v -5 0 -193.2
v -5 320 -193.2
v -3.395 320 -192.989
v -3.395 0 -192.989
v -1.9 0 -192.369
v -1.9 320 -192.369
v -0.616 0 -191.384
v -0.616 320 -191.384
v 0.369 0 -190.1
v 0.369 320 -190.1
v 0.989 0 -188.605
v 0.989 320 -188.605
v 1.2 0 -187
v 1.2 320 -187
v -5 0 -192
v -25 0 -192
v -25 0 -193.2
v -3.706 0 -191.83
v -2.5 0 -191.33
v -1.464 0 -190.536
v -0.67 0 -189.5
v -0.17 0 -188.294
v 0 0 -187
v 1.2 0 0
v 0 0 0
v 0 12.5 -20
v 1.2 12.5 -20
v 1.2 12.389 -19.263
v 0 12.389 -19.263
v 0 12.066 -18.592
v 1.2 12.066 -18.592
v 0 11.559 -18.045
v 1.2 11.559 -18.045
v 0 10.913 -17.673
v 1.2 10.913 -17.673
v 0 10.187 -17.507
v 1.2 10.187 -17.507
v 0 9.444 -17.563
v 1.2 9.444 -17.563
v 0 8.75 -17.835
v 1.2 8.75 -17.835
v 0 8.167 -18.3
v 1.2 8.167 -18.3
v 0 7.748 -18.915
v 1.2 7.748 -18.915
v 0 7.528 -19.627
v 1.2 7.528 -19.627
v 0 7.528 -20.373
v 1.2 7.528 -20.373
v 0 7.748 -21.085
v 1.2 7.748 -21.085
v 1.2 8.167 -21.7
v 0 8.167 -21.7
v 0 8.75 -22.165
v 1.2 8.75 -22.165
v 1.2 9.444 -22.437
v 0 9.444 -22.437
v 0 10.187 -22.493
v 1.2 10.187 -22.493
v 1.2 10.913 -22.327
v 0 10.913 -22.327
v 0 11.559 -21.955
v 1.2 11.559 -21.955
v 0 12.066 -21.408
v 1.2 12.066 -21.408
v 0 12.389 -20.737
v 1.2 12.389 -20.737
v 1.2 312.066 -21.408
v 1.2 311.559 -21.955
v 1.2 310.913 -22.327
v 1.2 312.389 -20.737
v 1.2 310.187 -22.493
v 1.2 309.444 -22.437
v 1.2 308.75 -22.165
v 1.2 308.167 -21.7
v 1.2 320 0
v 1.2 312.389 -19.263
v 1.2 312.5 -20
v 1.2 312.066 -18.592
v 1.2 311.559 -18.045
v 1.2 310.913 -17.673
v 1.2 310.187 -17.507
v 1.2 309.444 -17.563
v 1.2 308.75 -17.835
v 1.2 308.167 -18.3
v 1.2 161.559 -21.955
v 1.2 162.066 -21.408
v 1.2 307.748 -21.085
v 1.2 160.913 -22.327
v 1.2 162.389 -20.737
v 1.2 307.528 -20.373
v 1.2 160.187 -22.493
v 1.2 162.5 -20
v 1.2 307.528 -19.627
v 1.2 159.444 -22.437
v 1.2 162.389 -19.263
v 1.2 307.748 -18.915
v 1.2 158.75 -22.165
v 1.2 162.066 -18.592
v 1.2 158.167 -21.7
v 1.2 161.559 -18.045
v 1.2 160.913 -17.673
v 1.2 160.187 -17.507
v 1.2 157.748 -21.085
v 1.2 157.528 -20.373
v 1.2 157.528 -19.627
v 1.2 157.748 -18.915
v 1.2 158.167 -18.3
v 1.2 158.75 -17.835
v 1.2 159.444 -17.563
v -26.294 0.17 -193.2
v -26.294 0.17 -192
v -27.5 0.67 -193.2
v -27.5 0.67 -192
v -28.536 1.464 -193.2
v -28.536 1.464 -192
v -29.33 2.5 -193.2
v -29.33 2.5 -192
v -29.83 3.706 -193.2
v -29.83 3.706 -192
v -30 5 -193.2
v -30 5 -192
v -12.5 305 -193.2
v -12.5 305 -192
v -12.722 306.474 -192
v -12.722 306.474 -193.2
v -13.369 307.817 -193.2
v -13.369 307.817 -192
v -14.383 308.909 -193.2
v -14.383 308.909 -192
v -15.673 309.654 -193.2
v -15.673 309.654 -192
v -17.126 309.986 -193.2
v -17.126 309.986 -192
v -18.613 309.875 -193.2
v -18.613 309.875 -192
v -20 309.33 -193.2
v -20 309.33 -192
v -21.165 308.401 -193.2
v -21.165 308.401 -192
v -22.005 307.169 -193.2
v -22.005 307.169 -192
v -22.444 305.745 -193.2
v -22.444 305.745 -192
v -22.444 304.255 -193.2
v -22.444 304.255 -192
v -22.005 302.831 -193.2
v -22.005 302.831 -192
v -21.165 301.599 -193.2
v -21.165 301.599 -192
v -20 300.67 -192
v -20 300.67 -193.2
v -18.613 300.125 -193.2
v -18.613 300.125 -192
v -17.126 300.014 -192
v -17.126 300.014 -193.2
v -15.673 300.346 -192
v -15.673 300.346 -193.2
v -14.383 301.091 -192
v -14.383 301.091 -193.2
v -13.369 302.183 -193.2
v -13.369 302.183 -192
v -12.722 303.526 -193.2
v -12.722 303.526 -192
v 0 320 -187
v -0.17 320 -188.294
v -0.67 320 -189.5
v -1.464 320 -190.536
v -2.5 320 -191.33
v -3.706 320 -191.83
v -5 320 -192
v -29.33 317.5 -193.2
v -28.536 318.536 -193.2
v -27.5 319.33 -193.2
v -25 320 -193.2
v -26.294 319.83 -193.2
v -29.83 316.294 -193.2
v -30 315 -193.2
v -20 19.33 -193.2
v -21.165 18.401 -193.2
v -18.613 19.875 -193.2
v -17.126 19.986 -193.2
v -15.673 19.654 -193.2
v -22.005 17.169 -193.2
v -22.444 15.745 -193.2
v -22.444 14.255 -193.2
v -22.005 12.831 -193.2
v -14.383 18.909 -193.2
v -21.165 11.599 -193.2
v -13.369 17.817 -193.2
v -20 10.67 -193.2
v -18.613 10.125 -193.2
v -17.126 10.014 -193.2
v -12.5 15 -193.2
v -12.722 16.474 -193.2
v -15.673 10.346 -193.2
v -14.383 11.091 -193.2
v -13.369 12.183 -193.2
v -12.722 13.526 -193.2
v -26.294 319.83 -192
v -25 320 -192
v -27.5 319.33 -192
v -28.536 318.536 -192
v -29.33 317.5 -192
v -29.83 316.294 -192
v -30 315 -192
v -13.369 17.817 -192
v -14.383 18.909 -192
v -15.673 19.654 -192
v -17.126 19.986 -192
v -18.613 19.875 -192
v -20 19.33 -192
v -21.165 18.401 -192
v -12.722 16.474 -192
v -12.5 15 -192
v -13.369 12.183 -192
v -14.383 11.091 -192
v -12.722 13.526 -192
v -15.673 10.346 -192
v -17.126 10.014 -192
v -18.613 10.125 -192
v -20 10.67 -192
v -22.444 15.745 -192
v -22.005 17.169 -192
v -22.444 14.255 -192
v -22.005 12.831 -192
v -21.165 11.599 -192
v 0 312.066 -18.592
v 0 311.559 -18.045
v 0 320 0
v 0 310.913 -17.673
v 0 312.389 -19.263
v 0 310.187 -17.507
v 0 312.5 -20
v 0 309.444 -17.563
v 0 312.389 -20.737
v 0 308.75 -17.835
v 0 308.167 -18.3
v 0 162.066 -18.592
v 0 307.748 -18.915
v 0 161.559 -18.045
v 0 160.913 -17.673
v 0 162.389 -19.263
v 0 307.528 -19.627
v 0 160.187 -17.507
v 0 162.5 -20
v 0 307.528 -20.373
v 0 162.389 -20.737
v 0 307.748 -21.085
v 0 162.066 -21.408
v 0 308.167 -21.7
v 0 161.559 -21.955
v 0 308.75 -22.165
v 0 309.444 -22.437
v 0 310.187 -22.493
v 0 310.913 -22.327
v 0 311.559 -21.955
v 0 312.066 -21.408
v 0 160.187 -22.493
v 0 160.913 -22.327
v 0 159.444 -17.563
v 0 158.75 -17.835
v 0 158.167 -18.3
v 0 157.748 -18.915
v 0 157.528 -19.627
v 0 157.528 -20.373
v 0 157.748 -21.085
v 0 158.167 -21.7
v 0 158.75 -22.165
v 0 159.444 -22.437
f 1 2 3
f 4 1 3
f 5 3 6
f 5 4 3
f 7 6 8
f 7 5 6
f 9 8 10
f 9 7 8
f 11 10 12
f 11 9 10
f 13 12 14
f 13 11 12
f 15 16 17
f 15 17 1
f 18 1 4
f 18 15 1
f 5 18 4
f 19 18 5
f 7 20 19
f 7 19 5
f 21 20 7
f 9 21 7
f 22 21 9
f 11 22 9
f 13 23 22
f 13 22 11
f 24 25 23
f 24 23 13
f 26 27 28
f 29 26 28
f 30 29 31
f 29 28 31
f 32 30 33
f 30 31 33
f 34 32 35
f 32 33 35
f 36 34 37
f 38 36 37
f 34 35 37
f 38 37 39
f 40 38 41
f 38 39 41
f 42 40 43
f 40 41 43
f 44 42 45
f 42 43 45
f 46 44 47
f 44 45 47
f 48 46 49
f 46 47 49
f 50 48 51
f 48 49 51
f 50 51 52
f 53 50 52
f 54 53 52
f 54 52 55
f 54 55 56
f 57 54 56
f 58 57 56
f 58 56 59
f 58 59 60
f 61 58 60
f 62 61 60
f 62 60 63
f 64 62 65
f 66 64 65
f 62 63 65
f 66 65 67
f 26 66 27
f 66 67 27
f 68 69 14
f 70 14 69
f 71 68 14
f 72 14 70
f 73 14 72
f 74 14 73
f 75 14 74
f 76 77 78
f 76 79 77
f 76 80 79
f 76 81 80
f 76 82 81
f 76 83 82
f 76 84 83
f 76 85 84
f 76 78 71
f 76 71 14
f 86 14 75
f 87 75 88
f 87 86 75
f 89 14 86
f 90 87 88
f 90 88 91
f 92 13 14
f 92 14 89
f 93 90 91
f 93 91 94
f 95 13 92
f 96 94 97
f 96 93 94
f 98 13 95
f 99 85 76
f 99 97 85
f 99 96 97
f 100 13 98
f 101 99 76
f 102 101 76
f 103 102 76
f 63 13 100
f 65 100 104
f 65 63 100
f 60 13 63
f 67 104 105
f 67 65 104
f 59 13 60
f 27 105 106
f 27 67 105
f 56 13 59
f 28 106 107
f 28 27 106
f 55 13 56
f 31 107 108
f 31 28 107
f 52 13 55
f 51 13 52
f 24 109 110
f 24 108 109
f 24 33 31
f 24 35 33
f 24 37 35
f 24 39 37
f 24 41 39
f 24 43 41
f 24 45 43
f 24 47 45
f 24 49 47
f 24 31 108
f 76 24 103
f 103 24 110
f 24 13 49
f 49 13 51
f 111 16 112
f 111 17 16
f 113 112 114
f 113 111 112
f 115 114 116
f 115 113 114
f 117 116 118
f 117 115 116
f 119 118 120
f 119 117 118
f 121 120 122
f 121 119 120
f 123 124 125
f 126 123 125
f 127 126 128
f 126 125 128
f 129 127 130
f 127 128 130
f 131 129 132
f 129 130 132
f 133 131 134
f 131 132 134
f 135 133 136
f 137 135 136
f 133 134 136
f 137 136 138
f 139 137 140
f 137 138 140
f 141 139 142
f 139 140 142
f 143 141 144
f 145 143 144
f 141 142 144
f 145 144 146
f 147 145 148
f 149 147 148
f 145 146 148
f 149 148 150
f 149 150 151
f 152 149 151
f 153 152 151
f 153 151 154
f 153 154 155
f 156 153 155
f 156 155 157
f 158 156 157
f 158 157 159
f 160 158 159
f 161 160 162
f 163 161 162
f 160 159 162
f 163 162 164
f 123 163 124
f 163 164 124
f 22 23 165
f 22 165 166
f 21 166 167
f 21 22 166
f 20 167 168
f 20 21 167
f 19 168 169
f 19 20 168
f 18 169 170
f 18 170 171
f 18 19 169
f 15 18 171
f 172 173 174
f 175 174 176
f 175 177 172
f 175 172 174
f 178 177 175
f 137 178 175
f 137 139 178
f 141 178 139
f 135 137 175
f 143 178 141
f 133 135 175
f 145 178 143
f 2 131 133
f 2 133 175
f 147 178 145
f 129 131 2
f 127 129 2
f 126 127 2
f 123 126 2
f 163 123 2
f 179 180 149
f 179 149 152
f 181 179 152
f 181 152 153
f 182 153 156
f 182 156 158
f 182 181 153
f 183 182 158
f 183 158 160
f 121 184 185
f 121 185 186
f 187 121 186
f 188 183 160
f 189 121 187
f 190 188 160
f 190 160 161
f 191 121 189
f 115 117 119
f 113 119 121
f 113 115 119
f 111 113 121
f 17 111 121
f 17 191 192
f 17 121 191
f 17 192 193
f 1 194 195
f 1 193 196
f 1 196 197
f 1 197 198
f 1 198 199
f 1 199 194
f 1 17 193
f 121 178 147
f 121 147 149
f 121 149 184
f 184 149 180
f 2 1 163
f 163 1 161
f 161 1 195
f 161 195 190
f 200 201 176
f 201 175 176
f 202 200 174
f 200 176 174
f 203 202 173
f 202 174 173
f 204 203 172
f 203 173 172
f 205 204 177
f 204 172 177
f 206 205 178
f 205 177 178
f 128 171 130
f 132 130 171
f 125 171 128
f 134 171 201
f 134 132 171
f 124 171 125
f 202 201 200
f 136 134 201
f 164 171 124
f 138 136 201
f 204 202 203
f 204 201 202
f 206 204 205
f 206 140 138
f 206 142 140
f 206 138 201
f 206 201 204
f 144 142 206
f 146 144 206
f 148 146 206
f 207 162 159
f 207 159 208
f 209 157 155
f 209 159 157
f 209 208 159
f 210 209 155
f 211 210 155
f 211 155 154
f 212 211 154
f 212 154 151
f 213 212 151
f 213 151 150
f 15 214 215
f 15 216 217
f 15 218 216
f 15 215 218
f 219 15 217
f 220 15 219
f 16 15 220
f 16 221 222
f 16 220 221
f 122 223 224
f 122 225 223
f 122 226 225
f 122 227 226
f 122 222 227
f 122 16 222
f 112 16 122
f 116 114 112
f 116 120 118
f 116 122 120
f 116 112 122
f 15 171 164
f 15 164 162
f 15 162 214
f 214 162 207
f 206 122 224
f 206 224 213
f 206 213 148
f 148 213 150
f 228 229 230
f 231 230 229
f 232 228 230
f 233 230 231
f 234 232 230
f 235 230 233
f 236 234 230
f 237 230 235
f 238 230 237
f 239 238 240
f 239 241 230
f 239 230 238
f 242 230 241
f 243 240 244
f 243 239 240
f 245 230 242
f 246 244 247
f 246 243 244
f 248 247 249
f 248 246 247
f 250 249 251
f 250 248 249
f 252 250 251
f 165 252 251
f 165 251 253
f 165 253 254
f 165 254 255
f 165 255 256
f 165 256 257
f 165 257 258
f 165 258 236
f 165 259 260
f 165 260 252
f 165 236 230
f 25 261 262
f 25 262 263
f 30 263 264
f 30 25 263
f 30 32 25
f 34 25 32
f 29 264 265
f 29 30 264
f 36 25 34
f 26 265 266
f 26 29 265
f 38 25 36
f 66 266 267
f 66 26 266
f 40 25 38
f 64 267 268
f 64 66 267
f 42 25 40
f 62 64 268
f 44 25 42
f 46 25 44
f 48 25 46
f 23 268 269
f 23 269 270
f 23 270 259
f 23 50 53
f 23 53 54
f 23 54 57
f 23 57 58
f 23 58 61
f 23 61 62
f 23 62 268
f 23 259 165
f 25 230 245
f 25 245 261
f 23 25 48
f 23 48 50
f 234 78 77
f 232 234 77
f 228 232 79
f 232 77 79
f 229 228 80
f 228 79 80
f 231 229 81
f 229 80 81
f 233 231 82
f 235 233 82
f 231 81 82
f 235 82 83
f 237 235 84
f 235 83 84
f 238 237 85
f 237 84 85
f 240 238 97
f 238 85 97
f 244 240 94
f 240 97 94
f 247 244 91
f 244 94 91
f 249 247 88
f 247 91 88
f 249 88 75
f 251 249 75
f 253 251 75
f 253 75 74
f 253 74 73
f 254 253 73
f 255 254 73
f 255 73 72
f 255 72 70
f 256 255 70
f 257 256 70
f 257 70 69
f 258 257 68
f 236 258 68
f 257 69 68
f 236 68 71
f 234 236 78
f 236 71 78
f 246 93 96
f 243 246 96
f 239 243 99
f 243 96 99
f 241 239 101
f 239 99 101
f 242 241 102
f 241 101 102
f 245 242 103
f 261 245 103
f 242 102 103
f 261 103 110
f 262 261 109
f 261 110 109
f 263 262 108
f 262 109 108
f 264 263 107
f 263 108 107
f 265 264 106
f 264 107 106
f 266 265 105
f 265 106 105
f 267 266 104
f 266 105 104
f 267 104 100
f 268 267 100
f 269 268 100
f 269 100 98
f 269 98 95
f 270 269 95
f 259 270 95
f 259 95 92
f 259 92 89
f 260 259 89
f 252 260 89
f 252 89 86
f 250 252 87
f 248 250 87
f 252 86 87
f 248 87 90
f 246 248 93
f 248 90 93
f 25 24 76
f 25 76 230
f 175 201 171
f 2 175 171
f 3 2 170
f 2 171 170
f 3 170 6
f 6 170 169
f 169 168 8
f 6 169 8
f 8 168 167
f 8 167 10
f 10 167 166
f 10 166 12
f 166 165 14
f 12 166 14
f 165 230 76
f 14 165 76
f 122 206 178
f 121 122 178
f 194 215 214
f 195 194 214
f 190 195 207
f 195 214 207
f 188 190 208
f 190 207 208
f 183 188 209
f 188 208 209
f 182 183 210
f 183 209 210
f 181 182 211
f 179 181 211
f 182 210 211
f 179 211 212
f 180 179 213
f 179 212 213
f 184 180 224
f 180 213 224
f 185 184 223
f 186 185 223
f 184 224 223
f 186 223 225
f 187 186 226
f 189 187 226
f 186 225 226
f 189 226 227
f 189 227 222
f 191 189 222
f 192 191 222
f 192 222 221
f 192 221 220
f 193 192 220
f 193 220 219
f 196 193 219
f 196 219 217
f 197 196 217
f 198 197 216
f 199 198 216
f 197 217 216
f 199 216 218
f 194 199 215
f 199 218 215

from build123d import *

# Parameters (mm, degrees)
F1_DEPTH = 320
F2_R     = 5
F3_DEPTH = 1.2
F4_R     = 5
F5_R     = 2.5
F6_DEPTH = 1.2


with BuildPart() as f1:
    # F0 (on Front) → F1 (new body)
    with BuildSketch(Plane.XZ):
        with BuildLine():
            Line((1.2, 0), (0, 0))
            Line((0, 0), (0, -187))
            ThreePointArc((0, -187), (-1.464466, -190.535534), (-5, -192))
            Line((-5, -192), (-30, -192))
            Line((-30, -192), (-30, -193.2))
            Line((-30, -193.2), (-5, -193.2))
            ThreePointArc((-5, -193.2), (-0.615938, -191.384062), (1.2, -187))
            Line((1.2, -187), (1.2, 0))
        make_face()
    extrude(amount=-F1_DEPTH)

    # F2 (on face) → F3 (cut, through all)
    with BuildSketch(Plane.XY.offset(-192)):
        with Locations((-17.5, 305)):
            Circle(F2_R)
        with Locations((-17.5, 15)):
            Circle(F2_R)
    extrude(amount=-F3_DEPTH, mode=Mode.SUBTRACT)

    # F4
    f4_edges = [f1.edges().sort_by_distance(p)[0] for p in [
        (-30, 320, -192.6),
        (-30, 0, -192.6),
    ]]
    fillet(f4_edges, radius=F4_R)

    # F5 (on face) → F6 (cut, through all)
    with BuildSketch(Plane.YZ.offset(1.2)):
        with Locations((10, -20)):
            Circle(F5_R)
        with Locations((160, -20)):
            Circle(F5_R)
        with Locations((310, -20)):
            Circle(F5_R)
    extrude(amount=-F6_DEPTH, mode=Mode.SUBTRACT)


solid = f1.part
